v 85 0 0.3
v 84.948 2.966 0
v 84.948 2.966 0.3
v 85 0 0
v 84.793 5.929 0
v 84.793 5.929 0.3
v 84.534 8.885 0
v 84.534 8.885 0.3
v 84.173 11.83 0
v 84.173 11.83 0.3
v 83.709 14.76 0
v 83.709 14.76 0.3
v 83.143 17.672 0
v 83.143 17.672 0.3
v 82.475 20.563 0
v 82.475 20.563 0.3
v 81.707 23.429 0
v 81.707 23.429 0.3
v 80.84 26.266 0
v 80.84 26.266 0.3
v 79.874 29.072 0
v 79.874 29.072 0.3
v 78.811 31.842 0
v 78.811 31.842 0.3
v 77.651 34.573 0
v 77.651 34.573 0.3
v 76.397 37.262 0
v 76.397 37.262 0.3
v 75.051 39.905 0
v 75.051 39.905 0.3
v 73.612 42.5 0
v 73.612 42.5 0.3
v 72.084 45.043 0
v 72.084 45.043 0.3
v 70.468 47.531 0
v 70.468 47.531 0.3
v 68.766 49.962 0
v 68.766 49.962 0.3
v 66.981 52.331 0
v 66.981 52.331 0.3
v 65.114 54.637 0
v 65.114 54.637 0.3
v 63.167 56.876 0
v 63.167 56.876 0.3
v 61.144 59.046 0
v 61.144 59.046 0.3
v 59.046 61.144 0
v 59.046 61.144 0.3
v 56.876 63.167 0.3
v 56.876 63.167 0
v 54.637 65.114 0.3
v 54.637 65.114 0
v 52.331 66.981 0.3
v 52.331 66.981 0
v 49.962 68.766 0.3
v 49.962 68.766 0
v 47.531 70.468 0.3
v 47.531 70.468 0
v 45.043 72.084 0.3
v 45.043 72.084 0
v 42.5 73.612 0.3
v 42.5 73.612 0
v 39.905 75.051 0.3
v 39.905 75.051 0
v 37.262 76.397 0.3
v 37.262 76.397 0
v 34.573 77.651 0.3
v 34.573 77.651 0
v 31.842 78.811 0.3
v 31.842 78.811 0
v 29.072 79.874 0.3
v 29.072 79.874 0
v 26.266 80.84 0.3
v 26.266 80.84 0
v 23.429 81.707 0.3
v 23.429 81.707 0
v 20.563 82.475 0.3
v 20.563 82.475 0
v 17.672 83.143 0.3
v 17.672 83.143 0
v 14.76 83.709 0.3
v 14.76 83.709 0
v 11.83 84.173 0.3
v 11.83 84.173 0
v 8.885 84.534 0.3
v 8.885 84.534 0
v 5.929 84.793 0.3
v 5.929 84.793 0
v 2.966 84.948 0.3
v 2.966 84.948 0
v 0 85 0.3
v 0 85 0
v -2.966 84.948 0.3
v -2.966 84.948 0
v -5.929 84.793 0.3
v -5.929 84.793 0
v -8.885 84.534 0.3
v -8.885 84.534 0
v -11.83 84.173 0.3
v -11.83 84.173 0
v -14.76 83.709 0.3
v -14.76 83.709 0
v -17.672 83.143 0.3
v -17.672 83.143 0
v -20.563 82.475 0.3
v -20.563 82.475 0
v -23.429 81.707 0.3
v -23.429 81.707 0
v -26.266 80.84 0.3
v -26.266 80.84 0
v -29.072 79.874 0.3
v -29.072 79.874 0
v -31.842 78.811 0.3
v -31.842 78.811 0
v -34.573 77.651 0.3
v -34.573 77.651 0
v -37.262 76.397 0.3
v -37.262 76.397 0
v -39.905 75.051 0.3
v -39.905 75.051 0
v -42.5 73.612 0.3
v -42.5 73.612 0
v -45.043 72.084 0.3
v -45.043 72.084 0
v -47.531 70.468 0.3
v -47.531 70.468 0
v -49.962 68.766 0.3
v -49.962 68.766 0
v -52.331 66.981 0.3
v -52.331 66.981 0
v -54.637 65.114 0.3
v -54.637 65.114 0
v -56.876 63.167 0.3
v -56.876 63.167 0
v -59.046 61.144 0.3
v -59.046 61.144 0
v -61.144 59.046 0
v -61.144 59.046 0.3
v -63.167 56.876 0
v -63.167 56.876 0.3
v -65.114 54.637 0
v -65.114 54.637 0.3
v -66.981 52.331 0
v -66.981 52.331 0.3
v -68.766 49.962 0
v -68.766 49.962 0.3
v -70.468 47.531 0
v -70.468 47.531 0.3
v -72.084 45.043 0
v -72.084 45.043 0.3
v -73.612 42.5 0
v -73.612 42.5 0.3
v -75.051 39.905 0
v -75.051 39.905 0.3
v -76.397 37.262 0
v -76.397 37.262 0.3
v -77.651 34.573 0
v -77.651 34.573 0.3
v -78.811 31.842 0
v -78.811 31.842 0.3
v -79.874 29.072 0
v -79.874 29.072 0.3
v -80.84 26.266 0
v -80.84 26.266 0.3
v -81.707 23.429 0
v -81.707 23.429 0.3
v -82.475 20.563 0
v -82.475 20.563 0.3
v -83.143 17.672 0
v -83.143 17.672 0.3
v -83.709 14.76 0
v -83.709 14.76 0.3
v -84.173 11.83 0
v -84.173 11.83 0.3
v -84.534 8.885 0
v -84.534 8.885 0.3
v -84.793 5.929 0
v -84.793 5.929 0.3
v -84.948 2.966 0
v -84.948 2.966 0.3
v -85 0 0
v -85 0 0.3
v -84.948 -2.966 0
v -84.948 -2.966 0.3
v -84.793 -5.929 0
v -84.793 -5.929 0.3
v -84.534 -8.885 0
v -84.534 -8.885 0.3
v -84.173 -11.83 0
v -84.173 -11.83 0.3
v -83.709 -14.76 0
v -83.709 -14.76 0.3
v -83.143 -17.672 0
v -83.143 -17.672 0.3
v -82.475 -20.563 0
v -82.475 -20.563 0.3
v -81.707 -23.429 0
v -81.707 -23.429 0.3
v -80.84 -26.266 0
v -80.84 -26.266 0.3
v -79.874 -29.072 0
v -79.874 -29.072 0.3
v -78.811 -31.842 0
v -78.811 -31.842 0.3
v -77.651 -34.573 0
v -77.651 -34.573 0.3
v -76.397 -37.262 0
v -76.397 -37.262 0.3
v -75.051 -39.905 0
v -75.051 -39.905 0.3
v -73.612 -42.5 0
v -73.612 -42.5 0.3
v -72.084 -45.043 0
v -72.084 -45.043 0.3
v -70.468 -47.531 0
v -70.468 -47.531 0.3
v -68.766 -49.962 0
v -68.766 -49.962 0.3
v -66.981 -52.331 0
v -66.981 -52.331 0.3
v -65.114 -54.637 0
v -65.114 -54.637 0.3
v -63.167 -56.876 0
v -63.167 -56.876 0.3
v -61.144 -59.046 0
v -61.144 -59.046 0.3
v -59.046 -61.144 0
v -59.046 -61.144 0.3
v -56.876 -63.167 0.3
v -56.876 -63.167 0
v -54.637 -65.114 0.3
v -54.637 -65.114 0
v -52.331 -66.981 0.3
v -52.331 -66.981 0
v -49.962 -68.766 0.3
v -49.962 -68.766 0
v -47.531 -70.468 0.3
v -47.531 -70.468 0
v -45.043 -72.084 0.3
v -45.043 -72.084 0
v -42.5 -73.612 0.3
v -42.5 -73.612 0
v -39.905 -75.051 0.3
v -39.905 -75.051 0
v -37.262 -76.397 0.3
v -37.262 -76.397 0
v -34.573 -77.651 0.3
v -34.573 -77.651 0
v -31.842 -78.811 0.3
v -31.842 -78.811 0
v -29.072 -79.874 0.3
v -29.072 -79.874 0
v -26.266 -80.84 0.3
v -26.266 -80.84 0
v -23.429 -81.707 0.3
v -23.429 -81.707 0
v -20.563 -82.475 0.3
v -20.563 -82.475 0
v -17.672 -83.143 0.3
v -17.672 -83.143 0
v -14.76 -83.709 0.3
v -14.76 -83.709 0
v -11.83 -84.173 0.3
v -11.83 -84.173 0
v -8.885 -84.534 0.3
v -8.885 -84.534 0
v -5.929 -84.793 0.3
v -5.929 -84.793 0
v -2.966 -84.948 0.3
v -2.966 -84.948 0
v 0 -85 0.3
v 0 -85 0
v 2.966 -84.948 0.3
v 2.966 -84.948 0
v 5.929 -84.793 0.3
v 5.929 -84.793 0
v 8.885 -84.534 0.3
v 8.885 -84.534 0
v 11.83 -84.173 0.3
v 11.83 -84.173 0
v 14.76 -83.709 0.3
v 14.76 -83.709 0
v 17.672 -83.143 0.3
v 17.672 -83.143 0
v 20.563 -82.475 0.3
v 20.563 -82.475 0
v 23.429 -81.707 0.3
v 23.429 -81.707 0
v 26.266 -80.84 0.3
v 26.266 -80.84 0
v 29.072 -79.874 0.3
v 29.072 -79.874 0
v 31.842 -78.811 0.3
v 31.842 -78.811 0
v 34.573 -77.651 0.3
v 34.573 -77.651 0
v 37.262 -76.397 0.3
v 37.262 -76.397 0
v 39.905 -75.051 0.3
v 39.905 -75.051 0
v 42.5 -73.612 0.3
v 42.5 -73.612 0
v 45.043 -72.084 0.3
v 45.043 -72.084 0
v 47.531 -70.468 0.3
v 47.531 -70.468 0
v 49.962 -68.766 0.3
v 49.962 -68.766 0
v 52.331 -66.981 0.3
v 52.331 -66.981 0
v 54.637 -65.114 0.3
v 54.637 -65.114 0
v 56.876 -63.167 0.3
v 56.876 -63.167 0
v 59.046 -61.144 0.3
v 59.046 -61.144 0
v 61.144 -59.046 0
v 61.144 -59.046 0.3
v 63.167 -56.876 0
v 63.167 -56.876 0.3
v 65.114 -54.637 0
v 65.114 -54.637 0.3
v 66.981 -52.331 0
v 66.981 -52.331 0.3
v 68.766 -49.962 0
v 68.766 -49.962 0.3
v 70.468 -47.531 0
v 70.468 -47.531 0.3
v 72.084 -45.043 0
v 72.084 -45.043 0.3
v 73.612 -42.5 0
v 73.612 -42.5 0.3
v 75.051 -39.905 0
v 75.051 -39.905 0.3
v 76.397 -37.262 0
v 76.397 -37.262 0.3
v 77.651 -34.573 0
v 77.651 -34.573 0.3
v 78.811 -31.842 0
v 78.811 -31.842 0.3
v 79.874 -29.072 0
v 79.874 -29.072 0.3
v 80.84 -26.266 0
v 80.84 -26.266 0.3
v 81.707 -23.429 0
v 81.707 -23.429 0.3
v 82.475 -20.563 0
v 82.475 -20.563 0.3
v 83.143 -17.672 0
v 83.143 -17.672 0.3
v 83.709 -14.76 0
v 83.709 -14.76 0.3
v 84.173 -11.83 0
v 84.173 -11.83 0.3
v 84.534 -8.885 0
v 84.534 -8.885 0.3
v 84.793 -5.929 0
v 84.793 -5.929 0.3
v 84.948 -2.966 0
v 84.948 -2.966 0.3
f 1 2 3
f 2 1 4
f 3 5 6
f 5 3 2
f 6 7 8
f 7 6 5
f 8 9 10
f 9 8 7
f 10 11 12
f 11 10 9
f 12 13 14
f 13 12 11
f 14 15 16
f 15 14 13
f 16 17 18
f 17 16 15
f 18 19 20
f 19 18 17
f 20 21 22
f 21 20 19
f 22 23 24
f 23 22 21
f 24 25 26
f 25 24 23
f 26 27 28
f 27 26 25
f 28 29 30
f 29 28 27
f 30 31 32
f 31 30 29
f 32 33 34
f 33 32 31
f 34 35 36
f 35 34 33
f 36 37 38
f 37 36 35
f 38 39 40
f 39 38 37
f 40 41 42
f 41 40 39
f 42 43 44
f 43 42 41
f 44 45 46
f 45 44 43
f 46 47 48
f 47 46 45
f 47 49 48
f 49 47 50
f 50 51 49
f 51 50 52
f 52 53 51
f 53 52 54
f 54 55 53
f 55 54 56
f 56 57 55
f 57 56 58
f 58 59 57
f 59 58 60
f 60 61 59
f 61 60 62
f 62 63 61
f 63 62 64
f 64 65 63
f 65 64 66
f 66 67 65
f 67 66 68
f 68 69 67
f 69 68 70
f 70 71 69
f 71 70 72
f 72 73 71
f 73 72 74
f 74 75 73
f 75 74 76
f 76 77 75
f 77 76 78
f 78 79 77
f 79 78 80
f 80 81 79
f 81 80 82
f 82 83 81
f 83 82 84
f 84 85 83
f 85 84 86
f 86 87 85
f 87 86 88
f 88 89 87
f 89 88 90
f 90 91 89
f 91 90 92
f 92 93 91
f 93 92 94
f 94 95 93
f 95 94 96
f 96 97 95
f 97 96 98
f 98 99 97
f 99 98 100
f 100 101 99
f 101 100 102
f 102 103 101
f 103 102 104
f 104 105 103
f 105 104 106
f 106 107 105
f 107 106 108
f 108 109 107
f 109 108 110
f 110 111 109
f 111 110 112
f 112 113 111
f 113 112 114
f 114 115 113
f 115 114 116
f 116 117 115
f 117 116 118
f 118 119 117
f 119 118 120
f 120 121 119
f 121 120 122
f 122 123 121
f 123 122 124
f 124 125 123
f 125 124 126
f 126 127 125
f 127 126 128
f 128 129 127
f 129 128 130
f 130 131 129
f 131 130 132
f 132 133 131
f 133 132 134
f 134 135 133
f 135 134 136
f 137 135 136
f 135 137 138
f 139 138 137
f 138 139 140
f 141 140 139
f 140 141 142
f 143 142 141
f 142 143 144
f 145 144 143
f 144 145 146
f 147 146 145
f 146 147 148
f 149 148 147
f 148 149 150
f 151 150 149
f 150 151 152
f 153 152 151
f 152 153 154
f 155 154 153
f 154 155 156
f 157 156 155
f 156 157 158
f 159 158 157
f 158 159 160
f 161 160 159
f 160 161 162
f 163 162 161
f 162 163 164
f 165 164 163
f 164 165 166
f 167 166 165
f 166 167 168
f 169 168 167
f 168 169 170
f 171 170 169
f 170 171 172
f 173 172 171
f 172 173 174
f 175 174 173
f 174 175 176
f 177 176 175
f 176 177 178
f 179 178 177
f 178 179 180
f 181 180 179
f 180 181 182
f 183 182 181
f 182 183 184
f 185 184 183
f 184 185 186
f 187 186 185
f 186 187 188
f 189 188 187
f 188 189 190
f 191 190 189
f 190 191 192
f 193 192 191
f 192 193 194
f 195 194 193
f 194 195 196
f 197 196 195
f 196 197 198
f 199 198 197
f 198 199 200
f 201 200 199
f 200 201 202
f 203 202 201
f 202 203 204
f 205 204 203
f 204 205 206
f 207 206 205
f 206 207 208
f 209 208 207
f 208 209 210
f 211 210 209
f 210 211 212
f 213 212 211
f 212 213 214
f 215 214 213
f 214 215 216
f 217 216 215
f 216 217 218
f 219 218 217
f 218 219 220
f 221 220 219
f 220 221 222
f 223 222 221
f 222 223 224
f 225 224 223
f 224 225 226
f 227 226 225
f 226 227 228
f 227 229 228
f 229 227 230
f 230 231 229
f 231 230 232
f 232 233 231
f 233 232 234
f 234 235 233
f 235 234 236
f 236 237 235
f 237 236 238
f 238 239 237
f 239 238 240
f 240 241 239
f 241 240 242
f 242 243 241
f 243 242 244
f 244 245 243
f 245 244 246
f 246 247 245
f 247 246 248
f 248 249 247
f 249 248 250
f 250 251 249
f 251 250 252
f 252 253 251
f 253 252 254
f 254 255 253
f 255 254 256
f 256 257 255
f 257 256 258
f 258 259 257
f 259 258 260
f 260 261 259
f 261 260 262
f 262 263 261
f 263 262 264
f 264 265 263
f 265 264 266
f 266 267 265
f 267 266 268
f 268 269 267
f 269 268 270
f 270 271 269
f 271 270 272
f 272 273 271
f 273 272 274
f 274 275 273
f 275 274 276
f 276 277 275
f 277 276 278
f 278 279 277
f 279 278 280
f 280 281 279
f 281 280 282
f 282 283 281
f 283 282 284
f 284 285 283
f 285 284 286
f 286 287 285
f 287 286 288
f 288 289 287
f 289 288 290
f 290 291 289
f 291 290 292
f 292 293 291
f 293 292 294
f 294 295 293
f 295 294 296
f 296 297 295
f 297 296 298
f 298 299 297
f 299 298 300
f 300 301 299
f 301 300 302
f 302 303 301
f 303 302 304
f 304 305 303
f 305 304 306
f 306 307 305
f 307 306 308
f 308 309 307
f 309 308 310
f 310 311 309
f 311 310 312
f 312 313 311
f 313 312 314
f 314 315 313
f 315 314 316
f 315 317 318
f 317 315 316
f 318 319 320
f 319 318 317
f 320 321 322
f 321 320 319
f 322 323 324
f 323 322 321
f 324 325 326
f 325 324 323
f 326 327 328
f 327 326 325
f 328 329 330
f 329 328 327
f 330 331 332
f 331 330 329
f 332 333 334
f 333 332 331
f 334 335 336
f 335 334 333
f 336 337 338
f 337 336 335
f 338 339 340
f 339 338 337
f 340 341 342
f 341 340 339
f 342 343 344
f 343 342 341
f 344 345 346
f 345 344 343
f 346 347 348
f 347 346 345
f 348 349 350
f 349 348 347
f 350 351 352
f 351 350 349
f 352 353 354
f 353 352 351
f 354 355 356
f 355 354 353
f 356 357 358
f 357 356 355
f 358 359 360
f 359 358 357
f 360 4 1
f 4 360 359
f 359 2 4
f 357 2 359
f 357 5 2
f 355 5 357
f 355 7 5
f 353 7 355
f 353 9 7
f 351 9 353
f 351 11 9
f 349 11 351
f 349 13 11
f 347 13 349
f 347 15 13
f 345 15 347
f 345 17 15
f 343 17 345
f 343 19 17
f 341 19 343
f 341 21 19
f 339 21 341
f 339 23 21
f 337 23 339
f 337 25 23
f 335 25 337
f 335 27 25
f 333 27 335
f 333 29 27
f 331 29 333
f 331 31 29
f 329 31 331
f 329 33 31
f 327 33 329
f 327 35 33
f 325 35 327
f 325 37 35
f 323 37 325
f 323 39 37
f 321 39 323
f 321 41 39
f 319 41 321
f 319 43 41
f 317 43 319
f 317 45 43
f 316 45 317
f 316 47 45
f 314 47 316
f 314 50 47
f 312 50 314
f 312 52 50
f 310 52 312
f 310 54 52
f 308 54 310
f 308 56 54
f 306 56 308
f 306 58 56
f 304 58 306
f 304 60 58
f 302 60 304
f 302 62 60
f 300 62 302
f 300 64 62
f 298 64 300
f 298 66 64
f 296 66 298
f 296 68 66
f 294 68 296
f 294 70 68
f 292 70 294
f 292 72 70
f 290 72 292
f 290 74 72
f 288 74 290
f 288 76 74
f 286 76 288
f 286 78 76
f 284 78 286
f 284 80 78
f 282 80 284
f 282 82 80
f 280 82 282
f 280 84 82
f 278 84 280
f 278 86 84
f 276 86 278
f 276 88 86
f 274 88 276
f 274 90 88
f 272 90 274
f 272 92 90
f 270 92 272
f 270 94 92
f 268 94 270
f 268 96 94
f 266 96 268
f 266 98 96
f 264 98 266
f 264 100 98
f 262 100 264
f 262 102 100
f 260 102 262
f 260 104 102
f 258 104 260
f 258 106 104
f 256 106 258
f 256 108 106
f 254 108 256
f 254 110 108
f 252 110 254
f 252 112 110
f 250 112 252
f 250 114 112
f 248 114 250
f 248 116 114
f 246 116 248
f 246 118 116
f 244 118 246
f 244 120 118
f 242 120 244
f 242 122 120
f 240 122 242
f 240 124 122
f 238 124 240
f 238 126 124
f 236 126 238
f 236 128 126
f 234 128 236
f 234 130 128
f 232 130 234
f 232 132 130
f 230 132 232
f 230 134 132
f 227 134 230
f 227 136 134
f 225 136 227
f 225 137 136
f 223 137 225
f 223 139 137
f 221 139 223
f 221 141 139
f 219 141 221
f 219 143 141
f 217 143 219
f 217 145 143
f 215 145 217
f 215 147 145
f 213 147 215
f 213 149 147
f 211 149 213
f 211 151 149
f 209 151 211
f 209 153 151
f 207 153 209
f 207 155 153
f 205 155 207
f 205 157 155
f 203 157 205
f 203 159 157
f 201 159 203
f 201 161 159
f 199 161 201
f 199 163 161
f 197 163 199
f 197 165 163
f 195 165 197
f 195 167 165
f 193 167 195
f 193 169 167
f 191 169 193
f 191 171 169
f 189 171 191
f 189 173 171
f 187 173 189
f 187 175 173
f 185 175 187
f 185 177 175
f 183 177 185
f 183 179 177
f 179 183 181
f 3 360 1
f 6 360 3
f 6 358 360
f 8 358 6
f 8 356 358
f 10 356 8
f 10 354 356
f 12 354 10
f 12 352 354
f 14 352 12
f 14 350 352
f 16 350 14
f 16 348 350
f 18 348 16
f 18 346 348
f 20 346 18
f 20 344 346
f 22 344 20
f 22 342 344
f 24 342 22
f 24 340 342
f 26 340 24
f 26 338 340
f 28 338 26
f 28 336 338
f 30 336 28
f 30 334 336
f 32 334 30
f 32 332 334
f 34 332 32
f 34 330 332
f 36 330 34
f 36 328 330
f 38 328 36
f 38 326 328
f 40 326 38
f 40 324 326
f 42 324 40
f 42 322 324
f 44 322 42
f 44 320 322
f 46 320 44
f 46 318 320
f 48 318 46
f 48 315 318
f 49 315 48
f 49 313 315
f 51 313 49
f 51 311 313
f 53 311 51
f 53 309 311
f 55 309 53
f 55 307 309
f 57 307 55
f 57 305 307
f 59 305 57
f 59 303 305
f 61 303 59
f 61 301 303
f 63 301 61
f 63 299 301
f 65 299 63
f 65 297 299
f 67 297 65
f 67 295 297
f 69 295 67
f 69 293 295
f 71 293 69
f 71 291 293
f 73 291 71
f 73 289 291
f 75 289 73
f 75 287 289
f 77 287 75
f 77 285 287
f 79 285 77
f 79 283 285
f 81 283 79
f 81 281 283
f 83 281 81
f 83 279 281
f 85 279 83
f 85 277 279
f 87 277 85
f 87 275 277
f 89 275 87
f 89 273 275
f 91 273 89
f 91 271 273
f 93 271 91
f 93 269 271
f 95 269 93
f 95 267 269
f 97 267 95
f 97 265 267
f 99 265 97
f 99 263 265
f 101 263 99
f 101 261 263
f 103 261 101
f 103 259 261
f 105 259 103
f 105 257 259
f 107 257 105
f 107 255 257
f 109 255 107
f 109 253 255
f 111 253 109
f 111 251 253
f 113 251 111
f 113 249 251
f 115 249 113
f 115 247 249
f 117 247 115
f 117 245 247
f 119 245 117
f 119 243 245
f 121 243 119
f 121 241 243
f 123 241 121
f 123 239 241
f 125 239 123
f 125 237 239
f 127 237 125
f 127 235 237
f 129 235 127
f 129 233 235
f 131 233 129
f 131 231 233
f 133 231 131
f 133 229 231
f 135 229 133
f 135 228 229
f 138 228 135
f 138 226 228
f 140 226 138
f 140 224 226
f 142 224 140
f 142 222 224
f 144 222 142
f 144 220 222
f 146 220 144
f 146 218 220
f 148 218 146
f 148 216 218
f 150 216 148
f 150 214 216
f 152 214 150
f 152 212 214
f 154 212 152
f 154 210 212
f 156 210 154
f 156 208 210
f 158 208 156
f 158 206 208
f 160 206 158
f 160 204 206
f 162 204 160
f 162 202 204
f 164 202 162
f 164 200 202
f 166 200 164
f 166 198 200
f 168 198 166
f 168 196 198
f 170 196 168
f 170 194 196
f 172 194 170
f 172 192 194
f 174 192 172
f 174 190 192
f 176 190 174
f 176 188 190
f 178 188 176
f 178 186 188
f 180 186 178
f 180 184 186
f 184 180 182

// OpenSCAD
// file: ../configuration.scad
$fa = 2;
$fs = 0.5;

motor_end_height=44;
idler_end_height=28;
carriage_height=13.8;
platform_thickness=10;
platform_fix_dia=28;
platform_dia=38;

bearing_diameter=16;
bearing_dia_clearence=0.5;
bearing_free_dia_clearence=0.8;

hotend_diameter=16.4;
hotend_groove_dia=12;

// Frames

// Places mounting holes for the controller
// 33 = RAMPS 1.3 (Power outputs: Extruder, Bed, Fan)
// 34 = RAMPS 1.3 (Power outputs: Extruder0, Extruder1, Bed)
// 35 = RAMPS 1.3 (Power outputs: Extruder, Fan, Fan)
// 70 = Megatronics
// 701 = Megatronics 2.0

motherboard=35;

frame_thickness=8;

// Distance from motor axle to idler axle
// Calculated regarding length of the HTD3M closed belt 
belt_tooth=354;
spacing = round(((belt_tooth*3) - 3.14159 * 24.83) / 2);

rod_length=spacing+55;
rod_diameter=8;
//platform_hinge_offset=25;
//carriage_hinge_offset=17;

printbed_diameter=170;	//printable aera
printbed_thickness=4;		// used for rendering and approximating build volume


//corner_radius=12;
//frame_radius=(tower_radius-rod_diameter/2-corner_radius)/cos(30);

ball_link_distance=40;//55;
ball_offset=6.5;
ball_distance=ball_link_distance-2*ball_offset;
ball_angle=25;

// Delta Settings

delta_smooth_rod_offset=139.5;//140 - 152 floor(printbed_diameter/(2*sin(ball_angle))-printbed_diameter/2+delta_effector_offset+delta_carriage_offset)
delta_effector_offset=18;
delta_carriage_offset=18;
delta_diagonal_rod=ceil(max(printbed_diameter/2+delta_smooth_rod_offset-delta_effector_offset-delta_carriage_offset,printbed_diameter/(2*sin(ball_angle))));
//|-> 202
delta_radius=(delta_smooth_rod_offset-delta_effector_offset-delta_carriage_offset);

diagonal_rod_length=delta_diagonal_rod-2*8;//165
diagonal_rod_diameter=3;
diagonal_rod_length_lost=(printbed_diameter/(2*sin(ball_angle)))-(printbed_diameter/2+delta_smooth_rod_offset-delta_effector_offset-delta_carriage_offset);

diagonal_rod_angle=acos(delta_radius/delta_diagonal_rod);

echo_result=true;

carriage_altitude=sqrt(pow(delta_diagonal_rod,2)-pow(delta_radius,2));



if(echo_result) {
	echo("printbed_diameter",printbed_diameter);
	echo("delta_diagonal_rod",delta_diagonal_rod);
	echo("diagonal_rod_length",diagonal_rod_length);
	echo("delta_effector_offset",delta_effector_offset);
	echo("delta_carriage_offset",delta_carriage_offset);
	echo("delta_radius",delta_radius);
	echo("diagonal_rod_angle",diagonal_rod_angle);
	echo("carriage_altitude",carriage_altitude);
	echo("diagonal_rod_length_lost",diagonal_rod_length_lost);
	echo("delta_smooth_rod_offset_optimum",printbed_diameter/(2*sin(ball_angle))-printbed_diameter/2+delta_effector_offset+delta_carriage_offset);
	echo("rod_length",rod_length);
}
// main file
include <../configuration.scad>

cylinder(h=0.3,r=printbed_diameter/2,center=false);
